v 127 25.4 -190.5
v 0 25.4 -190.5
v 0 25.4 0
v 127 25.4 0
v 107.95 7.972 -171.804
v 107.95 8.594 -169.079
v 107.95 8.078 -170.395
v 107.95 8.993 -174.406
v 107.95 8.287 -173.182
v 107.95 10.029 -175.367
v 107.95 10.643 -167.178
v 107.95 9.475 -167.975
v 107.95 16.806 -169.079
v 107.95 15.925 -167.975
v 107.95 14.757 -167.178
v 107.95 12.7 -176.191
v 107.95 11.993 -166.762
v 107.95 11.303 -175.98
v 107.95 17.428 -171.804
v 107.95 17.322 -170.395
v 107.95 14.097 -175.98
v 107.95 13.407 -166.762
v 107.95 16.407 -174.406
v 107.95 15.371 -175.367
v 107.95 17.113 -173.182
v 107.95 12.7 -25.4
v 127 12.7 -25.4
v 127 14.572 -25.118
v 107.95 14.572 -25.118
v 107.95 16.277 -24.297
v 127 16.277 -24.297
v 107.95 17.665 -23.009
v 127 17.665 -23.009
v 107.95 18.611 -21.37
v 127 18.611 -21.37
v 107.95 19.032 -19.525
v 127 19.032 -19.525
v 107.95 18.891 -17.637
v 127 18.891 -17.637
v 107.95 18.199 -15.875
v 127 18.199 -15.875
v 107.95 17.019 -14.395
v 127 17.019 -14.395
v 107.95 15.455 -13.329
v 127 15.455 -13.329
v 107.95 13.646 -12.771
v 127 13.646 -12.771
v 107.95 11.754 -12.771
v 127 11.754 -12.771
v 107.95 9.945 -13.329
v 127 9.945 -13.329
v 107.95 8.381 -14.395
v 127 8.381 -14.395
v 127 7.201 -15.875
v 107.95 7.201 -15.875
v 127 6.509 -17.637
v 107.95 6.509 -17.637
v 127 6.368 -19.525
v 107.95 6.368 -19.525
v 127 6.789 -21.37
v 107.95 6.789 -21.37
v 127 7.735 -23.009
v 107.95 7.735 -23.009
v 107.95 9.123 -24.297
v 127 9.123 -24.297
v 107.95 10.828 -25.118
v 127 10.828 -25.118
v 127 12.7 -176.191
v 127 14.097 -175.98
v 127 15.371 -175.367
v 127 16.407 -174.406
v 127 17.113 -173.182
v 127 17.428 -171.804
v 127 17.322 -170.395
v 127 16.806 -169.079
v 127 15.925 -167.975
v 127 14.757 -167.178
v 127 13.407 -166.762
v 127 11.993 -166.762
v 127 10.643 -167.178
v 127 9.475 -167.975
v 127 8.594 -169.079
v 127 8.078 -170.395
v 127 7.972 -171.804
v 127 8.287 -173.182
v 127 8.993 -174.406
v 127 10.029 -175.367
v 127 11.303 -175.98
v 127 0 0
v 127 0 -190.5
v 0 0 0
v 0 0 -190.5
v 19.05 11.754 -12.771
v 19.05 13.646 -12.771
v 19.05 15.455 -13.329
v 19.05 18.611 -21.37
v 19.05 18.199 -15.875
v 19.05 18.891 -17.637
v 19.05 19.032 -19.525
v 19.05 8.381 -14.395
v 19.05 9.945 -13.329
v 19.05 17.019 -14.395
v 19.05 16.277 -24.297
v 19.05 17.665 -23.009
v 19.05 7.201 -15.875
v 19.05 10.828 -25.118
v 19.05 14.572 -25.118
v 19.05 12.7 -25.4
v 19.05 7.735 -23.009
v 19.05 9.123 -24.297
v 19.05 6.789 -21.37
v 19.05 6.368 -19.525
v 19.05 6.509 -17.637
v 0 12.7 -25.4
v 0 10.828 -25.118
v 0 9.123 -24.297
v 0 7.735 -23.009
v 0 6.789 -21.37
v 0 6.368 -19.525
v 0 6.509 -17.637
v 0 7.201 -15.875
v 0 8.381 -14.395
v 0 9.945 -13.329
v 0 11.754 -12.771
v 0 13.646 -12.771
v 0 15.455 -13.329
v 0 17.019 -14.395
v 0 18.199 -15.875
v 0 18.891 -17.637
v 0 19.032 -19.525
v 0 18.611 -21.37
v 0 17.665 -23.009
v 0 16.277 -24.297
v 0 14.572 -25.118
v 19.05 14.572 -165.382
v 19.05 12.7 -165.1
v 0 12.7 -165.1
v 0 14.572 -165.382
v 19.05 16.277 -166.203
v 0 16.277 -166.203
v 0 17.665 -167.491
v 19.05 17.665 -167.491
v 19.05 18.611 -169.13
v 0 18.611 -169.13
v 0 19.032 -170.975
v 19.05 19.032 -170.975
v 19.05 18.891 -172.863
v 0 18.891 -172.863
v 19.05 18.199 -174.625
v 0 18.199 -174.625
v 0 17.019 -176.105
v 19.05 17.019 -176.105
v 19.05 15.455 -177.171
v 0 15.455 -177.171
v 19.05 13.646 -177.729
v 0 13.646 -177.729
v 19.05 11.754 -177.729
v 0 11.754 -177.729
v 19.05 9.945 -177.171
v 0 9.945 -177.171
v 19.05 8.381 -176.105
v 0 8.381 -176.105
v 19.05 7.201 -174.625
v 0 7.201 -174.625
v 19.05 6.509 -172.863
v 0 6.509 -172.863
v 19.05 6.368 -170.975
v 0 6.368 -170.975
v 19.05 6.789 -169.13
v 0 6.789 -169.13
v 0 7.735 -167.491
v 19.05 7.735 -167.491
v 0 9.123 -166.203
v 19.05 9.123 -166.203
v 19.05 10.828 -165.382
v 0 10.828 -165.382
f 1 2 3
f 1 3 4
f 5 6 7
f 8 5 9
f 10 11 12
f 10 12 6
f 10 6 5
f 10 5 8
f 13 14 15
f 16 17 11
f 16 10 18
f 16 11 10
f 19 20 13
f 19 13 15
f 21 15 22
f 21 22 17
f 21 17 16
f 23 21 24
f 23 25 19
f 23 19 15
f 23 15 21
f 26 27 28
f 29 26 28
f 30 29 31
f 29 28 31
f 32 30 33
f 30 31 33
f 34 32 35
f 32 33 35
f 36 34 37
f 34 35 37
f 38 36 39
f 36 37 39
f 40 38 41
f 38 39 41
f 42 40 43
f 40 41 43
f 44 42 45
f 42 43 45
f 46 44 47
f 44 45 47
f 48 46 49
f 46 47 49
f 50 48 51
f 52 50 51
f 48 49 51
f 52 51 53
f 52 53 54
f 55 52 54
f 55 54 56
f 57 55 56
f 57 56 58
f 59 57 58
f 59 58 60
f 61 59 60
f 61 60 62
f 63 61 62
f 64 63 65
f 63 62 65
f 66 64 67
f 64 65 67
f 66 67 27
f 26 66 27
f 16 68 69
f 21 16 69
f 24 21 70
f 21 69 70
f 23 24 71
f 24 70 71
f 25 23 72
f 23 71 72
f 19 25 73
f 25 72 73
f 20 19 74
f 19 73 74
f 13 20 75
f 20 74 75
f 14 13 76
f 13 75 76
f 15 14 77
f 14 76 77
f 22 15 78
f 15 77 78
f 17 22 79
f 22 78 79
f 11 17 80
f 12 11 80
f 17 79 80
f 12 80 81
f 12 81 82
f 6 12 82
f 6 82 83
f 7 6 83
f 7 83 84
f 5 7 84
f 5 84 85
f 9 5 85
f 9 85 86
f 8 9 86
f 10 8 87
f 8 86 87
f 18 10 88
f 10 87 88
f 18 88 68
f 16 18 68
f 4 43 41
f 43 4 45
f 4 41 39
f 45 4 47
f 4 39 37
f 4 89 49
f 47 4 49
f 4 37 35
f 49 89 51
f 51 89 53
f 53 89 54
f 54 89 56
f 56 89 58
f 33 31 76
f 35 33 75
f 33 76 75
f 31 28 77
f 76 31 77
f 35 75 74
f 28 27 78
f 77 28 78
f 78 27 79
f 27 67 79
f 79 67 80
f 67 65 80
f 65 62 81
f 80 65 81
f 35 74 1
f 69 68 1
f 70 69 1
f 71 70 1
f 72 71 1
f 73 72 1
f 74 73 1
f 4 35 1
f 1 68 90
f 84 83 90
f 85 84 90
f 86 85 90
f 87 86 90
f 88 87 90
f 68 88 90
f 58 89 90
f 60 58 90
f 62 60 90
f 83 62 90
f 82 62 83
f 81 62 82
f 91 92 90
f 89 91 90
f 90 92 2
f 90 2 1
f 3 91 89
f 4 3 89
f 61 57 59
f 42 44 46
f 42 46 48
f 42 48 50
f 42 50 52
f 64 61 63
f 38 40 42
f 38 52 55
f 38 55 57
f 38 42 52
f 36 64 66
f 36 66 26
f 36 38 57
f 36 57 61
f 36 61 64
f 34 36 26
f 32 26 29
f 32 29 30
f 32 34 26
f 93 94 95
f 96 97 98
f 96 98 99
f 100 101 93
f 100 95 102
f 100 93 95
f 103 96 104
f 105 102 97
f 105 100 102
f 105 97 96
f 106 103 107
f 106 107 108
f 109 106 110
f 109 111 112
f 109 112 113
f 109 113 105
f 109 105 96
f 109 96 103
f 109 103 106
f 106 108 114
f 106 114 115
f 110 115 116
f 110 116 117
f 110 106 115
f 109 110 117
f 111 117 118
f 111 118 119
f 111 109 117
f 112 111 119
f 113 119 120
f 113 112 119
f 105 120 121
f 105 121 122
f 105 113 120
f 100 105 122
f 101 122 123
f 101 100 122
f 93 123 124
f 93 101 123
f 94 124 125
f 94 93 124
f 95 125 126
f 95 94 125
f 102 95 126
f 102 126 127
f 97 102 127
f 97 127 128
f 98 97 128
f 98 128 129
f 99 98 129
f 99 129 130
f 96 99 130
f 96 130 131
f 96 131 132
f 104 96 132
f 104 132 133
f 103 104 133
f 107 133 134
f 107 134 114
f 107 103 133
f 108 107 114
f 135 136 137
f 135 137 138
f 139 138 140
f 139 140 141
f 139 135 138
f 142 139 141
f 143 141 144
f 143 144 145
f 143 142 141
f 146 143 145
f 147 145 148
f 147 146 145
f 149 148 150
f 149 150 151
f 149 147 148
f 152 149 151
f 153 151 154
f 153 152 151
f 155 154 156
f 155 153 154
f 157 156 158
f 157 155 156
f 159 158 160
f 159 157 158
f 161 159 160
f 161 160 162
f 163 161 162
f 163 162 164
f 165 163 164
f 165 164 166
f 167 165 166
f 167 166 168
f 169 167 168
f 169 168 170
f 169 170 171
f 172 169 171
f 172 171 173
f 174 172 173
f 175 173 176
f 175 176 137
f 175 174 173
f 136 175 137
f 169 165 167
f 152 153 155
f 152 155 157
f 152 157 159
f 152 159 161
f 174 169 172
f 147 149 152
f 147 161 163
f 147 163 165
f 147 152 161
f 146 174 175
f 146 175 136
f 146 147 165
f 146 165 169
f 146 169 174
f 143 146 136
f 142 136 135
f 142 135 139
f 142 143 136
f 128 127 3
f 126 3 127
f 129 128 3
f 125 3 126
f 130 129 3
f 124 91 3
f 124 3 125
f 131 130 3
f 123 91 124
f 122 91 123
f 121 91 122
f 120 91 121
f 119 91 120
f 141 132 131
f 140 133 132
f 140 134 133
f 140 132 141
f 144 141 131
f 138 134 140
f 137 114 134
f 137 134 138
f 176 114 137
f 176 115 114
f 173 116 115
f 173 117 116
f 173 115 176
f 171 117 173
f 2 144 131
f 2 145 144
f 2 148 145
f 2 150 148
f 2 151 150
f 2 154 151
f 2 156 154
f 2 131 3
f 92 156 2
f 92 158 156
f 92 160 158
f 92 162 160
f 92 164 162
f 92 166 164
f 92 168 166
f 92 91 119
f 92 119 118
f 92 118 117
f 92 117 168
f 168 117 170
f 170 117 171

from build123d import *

# Parameters (mm, degrees)
SKETCH1_W           = 127
SKETCH1_H           = 190.5
BOSS_EXTRUDE1_DEPTH = 25.4
SKETCH2_R           = 6.35
CUT_EXTRUDE1_DEPTH  = 19.05
SKETCH3_R           = 4.741125957
CUT_EXTRUDE2_DEPTH  = 19.05
CUT_EXTRUDE3_START  = -19.05
SKETCH8_R           = 6.35
CUT_EXTRUDE3_DEPTH  = 19.05


with BuildPart() as part:
    # Sketch1 → Boss-Extrude1 (new body)
    with BuildSketch(Plane(origin=(0, 0, 0), x_dir=(1, 0, 0), z_dir=(0, 1, 0))):
        with Locations((63.5, 95.25)):
            Rectangle(SKETCH1_W, SKETCH1_H)
    extrude(amount=BOSS_EXTRUDE1_DEPTH)

    # Sketch2 → Cut-Extrude1 (cut)
    with BuildSketch(Plane(origin=(127, 0, 0), x_dir=(0, 0, -1), z_dir=(1, 0, 0))):
        with Locations((19.05, 12.7)):
            Circle(SKETCH2_R)
    extrude(amount=-CUT_EXTRUDE1_DEPTH, mode=Mode.SUBTRACT)

    # Sketch3 → Cut-Extrude2 (cut)
    with BuildSketch(Plane(origin=(127, 0, 0), x_dir=(0, 0, -1), z_dir=(1, 0, 0))):
        with Locations((171.45, 12.7)):
            Circle(SKETCH3_R)
    extrude(amount=-CUT_EXTRUDE2_DEPTH, mode=Mode.SUBTRACT)

    # Sketch8 → Cut-Extrude3 (cut)
    with BuildSketch(Plane.ZY.offset(CUT_EXTRUDE3_START)):
        with Locations((-171.45, 12.7)):
            Circle(SKETCH8_R)
        with Locations(Location((-19.05, 12.7, 0), (0, 0, 180))):
            Circle(SKETCH8_R)
    extrude(amount=CUT_EXTRUDE3_DEPTH, mode=Mode.SUBTRACT)


solid = part.part
